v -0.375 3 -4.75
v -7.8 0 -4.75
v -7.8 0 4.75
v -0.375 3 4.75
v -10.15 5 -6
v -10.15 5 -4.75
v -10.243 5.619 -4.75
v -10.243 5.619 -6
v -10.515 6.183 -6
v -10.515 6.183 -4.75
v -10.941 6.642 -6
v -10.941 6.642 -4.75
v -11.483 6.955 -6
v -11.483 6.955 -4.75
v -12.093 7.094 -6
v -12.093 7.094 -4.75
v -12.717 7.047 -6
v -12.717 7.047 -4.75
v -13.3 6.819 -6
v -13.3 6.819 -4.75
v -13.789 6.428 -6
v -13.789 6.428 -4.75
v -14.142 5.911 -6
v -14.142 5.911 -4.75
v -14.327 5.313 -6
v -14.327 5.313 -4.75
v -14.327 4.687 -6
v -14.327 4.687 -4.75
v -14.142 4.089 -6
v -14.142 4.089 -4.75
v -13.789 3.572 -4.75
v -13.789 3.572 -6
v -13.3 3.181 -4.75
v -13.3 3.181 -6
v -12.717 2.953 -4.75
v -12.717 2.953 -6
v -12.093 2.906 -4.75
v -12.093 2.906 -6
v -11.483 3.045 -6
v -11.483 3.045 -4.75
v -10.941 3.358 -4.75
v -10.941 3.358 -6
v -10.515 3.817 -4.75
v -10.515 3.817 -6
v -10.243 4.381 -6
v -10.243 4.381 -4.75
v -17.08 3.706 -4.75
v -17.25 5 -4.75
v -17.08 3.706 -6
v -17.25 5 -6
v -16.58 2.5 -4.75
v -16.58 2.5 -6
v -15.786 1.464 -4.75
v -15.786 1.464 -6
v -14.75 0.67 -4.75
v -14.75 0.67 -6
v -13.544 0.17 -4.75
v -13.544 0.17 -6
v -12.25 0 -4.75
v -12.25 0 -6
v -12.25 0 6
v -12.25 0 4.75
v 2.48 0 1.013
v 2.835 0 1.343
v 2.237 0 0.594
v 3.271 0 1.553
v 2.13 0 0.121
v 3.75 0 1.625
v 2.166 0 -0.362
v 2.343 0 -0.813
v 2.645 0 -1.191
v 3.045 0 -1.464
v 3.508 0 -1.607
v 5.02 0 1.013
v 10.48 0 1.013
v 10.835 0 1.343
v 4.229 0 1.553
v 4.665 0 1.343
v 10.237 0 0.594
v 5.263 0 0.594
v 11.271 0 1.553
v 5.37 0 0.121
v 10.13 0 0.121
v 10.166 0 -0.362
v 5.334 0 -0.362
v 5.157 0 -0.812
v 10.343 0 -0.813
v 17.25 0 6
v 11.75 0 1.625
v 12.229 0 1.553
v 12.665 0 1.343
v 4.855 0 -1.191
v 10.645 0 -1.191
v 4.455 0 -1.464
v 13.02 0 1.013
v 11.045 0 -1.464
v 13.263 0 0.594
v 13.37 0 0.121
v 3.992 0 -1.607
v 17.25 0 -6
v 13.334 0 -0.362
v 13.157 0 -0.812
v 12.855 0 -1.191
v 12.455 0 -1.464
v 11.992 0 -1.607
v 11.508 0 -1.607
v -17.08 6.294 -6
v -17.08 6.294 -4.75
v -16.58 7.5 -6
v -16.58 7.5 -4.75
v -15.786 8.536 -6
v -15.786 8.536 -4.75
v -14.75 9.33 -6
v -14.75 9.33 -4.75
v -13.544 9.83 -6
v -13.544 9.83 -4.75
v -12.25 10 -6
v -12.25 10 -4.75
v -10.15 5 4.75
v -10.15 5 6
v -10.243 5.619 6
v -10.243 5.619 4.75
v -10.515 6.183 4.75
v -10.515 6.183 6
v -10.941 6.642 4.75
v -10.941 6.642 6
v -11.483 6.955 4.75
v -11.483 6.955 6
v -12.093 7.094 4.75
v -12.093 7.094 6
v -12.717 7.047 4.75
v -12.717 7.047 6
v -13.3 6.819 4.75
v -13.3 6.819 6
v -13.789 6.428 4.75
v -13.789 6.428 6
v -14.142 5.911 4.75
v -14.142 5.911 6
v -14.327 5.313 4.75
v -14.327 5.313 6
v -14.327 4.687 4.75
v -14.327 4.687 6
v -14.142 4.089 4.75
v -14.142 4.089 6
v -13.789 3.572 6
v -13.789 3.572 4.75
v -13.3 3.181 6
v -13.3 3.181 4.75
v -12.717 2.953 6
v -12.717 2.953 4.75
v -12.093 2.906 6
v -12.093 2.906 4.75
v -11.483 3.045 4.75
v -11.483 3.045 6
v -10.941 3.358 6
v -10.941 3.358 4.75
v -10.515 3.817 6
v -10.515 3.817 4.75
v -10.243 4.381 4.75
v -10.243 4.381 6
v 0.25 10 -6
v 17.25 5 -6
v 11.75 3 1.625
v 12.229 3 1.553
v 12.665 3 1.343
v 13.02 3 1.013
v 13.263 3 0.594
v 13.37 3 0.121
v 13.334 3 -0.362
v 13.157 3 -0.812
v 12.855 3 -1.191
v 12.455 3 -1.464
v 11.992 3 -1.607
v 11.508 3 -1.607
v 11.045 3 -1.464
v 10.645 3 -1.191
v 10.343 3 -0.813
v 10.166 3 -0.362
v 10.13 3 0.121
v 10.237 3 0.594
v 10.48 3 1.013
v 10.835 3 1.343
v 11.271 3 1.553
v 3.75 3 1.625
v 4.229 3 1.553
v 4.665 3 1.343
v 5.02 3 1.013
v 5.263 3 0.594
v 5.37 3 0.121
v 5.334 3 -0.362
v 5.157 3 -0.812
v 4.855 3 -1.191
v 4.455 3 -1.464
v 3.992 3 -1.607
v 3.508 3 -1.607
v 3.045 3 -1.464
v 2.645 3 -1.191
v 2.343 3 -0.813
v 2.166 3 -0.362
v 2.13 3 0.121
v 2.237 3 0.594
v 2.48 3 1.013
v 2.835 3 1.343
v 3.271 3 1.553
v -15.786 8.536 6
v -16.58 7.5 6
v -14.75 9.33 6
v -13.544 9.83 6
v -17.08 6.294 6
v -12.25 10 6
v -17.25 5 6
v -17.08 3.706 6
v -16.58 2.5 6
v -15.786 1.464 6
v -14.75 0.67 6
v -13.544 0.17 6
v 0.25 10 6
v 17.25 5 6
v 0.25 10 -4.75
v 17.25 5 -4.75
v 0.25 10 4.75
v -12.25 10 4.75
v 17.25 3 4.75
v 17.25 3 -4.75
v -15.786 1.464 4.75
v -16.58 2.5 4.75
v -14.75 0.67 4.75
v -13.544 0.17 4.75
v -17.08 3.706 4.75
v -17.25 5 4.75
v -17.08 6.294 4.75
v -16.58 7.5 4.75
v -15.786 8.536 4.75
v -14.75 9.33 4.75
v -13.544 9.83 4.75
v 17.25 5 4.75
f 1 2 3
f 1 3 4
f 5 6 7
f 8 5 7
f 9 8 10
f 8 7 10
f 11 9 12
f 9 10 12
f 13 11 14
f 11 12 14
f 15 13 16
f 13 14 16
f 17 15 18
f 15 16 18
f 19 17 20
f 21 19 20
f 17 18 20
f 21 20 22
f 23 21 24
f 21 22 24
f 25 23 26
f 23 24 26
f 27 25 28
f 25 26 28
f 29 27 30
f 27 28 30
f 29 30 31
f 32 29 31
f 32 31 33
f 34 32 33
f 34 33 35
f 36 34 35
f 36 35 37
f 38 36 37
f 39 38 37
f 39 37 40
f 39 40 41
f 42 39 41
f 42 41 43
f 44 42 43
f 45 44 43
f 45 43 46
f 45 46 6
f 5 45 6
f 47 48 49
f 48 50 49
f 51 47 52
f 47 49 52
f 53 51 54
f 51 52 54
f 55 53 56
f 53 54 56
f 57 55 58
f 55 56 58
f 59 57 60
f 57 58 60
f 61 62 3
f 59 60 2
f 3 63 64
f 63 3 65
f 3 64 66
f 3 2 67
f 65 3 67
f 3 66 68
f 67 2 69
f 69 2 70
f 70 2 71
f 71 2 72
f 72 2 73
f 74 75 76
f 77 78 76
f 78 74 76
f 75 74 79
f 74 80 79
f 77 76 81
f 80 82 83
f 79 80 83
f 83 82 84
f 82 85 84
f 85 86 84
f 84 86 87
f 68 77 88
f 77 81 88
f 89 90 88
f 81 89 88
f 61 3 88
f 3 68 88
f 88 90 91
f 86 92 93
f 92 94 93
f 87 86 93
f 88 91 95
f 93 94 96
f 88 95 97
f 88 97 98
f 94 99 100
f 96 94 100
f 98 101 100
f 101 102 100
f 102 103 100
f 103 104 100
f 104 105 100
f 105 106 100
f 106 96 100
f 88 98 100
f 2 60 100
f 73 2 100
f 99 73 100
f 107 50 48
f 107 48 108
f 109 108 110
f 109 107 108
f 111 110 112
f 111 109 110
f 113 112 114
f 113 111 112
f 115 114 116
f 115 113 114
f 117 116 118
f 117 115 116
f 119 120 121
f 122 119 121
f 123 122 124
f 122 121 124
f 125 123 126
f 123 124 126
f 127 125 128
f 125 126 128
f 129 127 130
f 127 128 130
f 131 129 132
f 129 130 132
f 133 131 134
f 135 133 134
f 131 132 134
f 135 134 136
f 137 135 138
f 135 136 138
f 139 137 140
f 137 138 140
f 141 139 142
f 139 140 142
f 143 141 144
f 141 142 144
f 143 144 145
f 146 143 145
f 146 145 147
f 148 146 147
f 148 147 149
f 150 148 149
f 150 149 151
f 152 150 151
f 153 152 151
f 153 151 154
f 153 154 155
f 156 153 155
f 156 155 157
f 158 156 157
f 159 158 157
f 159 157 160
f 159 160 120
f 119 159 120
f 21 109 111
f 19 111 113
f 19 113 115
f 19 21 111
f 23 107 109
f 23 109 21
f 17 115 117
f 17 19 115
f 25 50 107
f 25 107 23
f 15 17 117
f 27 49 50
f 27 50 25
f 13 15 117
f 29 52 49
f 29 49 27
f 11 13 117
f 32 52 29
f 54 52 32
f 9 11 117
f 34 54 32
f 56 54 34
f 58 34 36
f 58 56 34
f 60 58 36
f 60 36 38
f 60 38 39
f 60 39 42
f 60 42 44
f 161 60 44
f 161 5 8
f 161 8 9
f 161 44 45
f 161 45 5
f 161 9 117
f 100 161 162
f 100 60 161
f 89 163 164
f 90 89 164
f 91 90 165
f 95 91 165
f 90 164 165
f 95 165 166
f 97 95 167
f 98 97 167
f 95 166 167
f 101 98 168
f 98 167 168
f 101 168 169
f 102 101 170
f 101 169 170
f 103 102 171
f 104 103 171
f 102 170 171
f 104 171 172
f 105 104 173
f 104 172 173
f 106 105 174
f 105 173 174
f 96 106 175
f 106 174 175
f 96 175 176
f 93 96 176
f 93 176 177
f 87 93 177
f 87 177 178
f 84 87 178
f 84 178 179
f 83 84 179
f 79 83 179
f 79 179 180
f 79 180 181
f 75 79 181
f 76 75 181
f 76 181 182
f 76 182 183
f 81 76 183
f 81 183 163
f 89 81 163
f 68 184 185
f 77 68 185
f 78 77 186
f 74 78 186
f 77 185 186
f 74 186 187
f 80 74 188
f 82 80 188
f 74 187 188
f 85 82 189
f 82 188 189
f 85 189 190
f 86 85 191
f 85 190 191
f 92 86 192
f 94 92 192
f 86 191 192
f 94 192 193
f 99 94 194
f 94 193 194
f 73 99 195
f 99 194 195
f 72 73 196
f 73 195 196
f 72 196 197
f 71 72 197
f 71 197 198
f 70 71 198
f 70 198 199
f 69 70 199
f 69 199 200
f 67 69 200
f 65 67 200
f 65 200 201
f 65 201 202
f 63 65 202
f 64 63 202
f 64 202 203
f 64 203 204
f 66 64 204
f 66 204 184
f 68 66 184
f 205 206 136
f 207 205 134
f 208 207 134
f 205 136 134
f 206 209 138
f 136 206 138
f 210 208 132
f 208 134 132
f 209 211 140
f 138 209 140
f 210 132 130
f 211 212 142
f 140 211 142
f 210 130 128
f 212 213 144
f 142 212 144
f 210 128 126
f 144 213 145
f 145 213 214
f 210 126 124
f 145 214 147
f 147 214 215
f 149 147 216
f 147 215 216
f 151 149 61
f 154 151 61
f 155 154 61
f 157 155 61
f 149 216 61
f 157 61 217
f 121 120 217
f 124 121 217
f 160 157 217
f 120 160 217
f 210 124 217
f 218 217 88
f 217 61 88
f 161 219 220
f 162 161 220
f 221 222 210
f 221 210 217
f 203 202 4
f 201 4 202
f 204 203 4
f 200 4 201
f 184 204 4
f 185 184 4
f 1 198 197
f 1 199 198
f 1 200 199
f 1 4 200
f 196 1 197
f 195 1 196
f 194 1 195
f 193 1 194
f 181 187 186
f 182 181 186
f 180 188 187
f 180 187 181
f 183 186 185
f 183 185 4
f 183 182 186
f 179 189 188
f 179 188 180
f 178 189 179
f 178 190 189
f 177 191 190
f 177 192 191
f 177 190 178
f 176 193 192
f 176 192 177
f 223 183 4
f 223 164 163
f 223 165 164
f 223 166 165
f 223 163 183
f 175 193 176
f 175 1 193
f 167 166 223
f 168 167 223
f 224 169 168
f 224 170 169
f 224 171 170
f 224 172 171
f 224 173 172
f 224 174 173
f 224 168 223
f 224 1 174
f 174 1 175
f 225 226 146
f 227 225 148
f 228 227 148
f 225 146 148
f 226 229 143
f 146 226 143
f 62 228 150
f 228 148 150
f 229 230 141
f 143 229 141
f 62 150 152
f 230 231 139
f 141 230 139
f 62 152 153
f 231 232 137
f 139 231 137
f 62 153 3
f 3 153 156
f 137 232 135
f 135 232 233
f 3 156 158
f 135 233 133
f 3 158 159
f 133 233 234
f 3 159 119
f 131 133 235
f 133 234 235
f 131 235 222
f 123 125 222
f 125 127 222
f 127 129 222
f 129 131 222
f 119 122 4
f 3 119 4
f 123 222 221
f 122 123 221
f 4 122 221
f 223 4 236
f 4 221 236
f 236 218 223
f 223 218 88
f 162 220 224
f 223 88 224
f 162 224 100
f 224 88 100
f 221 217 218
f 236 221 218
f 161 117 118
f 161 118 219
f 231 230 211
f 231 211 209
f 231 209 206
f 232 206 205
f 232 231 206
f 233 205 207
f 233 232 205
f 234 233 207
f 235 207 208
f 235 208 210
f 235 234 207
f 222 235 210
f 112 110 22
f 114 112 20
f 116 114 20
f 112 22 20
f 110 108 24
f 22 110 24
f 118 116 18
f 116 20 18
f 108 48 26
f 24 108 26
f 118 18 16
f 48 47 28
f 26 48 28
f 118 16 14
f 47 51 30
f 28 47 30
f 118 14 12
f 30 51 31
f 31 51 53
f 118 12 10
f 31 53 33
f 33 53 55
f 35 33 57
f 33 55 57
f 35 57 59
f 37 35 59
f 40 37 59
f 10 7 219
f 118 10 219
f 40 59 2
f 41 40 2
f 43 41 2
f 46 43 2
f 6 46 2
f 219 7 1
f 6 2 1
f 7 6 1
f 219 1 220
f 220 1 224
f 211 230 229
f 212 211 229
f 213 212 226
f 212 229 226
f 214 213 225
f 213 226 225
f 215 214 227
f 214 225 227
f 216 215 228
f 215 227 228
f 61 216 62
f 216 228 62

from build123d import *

# Parameters (mm, degrees)
CROQUIS1_W              = 34.5
CROQUIS1_H              = 12
SALIENTE_EXTRUIR1_DEPTH = 10
REDONDEO1_R             = 5
CROQUIS8_W              = 34.5
CROQUIS8_H              = 9.5
CORTAR_EXTRUIR6_DEPTH   = 7
CROQUIS9_W              = 10.737065785
CROQUIS9_H              = 9.5
CORTAR_EXTRUIR7_DEPTH   = 21.822163672
CHAFL_N1_SIZE           = 3
CHAFL_N1_SIZE_2         = 7.42526056
CORTAR_EXTRUIR8_DEPTH   = 24.27149544
CROQUIS11_R             = 2.1
CORTAR_EXTRUIR9_DEPTH   = 24.27149544
CROQUIS12_R             = 1.625
CORTAR_EXTRUIR10_DEPTH  = 20.559204994


# Some blends are built 0.0001 mm under size
with BuildPart() as part:
    # Croquis1 → Saliente-Extruir1 (new body)
    with BuildSketch(Plane(origin=(0, 0, 0), x_dir=(1, 0, 0), z_dir=(0, 1, 0))):
        Rectangle(CROQUIS1_W, CROQUIS1_H)
    extrude(amount=SALIENTE_EXTRUIR1_DEPTH)

    # Redondeo1
    redondeo1_edges = [part.edges().sort_by_distance(p)[0] for p in [
        (-17.25, 10, 0),
        (-17.25, 0, 0),
    ]]
    fillet(redondeo1_edges, radius=REDONDEO1_R - 0.0001)  # a hair under: the kernel refuses the full size

    # Croquis8 → Cortar-Extruir6 (cut)
    with BuildSketch(Plane(origin=(0, 10, 0), x_dir=(1, 0, 0), z_dir=(0, 1, 0))):
        Rectangle(CROQUIS8_W, CROQUIS8_H)
    extrude(amount=-CORTAR_EXTRUIR6_DEPTH, mode=Mode.SUBTRACT)

    # Croquis9 → Cortar-Extruir7 (cut, through all)
    with BuildSketch(Plane.XZ):
        with Locations((-13.168532893, 0)):
            Rectangle(CROQUIS9_W, CROQUIS9_H)
    extrude(amount=-CORTAR_EXTRUIR7_DEPTH, mode=Mode.SUBTRACT)

    # Chaflán1
    # the kernel refuses this chamfer: 7.42526056, 3 mm, written as the material it takes off along each edge
    with BuildSketch(Plane(origin=(-7.8, 3, -4.75), x_dir=(-0.08816706473193606, -0.9961057015681392, 0), z_dir=(0, 0, 1))) as chafl_n1_piece_1:
        Polygon((CHAFL_N1_SIZE * 0.996105701568, CHAFL_N1_SIZE * 0.0881670647319), (-CHAFL_N1_SIZE_2 * 0.0881670647349, CHAFL_N1_SIZE_2 * 0.996105701602), (0, 0), align=None)
    extrude(amount=9.5, mode=Mode.SUBTRACT)

    # Croquis10 → Cortar-Extruir8 (cut, through all)
    with BuildSketch(Plane.XY.offset(6)):
        Polygon((0.25, 10), (17.25, 5), (17.25, 10), align=None)
    extrude(amount=-CORTAR_EXTRUIR8_DEPTH, mode=Mode.SUBTRACT)

    # Croquis11 → Cortar-Extruir9 (cut, through all)
    with BuildSketch(Plane.XY.offset(6)):
        with Locations((-12.25, 5)):
            Circle(CROQUIS11_R)
    extrude(amount=-CORTAR_EXTRUIR9_DEPTH, mode=Mode.SUBTRACT)

    # Croquis12 → Cortar-Extruir10 (cut, through all)
    with BuildSketch(Plane(origin=(0, 3, 0), x_dir=(1, 0, 0), z_dir=(0, 1, 0))):
        with Locations(Location((3.75, 0, 0), (0, 0, 270))):
            Circle(CROQUIS12_R)
        with Locations(Location((11.75, 0, 0), (0, 0, 270))):
            Circle(CROQUIS12_R)
    extrude(amount=-CORTAR_EXTRUIR10_DEPTH, mode=Mode.SUBTRACT)


solid = part.part
